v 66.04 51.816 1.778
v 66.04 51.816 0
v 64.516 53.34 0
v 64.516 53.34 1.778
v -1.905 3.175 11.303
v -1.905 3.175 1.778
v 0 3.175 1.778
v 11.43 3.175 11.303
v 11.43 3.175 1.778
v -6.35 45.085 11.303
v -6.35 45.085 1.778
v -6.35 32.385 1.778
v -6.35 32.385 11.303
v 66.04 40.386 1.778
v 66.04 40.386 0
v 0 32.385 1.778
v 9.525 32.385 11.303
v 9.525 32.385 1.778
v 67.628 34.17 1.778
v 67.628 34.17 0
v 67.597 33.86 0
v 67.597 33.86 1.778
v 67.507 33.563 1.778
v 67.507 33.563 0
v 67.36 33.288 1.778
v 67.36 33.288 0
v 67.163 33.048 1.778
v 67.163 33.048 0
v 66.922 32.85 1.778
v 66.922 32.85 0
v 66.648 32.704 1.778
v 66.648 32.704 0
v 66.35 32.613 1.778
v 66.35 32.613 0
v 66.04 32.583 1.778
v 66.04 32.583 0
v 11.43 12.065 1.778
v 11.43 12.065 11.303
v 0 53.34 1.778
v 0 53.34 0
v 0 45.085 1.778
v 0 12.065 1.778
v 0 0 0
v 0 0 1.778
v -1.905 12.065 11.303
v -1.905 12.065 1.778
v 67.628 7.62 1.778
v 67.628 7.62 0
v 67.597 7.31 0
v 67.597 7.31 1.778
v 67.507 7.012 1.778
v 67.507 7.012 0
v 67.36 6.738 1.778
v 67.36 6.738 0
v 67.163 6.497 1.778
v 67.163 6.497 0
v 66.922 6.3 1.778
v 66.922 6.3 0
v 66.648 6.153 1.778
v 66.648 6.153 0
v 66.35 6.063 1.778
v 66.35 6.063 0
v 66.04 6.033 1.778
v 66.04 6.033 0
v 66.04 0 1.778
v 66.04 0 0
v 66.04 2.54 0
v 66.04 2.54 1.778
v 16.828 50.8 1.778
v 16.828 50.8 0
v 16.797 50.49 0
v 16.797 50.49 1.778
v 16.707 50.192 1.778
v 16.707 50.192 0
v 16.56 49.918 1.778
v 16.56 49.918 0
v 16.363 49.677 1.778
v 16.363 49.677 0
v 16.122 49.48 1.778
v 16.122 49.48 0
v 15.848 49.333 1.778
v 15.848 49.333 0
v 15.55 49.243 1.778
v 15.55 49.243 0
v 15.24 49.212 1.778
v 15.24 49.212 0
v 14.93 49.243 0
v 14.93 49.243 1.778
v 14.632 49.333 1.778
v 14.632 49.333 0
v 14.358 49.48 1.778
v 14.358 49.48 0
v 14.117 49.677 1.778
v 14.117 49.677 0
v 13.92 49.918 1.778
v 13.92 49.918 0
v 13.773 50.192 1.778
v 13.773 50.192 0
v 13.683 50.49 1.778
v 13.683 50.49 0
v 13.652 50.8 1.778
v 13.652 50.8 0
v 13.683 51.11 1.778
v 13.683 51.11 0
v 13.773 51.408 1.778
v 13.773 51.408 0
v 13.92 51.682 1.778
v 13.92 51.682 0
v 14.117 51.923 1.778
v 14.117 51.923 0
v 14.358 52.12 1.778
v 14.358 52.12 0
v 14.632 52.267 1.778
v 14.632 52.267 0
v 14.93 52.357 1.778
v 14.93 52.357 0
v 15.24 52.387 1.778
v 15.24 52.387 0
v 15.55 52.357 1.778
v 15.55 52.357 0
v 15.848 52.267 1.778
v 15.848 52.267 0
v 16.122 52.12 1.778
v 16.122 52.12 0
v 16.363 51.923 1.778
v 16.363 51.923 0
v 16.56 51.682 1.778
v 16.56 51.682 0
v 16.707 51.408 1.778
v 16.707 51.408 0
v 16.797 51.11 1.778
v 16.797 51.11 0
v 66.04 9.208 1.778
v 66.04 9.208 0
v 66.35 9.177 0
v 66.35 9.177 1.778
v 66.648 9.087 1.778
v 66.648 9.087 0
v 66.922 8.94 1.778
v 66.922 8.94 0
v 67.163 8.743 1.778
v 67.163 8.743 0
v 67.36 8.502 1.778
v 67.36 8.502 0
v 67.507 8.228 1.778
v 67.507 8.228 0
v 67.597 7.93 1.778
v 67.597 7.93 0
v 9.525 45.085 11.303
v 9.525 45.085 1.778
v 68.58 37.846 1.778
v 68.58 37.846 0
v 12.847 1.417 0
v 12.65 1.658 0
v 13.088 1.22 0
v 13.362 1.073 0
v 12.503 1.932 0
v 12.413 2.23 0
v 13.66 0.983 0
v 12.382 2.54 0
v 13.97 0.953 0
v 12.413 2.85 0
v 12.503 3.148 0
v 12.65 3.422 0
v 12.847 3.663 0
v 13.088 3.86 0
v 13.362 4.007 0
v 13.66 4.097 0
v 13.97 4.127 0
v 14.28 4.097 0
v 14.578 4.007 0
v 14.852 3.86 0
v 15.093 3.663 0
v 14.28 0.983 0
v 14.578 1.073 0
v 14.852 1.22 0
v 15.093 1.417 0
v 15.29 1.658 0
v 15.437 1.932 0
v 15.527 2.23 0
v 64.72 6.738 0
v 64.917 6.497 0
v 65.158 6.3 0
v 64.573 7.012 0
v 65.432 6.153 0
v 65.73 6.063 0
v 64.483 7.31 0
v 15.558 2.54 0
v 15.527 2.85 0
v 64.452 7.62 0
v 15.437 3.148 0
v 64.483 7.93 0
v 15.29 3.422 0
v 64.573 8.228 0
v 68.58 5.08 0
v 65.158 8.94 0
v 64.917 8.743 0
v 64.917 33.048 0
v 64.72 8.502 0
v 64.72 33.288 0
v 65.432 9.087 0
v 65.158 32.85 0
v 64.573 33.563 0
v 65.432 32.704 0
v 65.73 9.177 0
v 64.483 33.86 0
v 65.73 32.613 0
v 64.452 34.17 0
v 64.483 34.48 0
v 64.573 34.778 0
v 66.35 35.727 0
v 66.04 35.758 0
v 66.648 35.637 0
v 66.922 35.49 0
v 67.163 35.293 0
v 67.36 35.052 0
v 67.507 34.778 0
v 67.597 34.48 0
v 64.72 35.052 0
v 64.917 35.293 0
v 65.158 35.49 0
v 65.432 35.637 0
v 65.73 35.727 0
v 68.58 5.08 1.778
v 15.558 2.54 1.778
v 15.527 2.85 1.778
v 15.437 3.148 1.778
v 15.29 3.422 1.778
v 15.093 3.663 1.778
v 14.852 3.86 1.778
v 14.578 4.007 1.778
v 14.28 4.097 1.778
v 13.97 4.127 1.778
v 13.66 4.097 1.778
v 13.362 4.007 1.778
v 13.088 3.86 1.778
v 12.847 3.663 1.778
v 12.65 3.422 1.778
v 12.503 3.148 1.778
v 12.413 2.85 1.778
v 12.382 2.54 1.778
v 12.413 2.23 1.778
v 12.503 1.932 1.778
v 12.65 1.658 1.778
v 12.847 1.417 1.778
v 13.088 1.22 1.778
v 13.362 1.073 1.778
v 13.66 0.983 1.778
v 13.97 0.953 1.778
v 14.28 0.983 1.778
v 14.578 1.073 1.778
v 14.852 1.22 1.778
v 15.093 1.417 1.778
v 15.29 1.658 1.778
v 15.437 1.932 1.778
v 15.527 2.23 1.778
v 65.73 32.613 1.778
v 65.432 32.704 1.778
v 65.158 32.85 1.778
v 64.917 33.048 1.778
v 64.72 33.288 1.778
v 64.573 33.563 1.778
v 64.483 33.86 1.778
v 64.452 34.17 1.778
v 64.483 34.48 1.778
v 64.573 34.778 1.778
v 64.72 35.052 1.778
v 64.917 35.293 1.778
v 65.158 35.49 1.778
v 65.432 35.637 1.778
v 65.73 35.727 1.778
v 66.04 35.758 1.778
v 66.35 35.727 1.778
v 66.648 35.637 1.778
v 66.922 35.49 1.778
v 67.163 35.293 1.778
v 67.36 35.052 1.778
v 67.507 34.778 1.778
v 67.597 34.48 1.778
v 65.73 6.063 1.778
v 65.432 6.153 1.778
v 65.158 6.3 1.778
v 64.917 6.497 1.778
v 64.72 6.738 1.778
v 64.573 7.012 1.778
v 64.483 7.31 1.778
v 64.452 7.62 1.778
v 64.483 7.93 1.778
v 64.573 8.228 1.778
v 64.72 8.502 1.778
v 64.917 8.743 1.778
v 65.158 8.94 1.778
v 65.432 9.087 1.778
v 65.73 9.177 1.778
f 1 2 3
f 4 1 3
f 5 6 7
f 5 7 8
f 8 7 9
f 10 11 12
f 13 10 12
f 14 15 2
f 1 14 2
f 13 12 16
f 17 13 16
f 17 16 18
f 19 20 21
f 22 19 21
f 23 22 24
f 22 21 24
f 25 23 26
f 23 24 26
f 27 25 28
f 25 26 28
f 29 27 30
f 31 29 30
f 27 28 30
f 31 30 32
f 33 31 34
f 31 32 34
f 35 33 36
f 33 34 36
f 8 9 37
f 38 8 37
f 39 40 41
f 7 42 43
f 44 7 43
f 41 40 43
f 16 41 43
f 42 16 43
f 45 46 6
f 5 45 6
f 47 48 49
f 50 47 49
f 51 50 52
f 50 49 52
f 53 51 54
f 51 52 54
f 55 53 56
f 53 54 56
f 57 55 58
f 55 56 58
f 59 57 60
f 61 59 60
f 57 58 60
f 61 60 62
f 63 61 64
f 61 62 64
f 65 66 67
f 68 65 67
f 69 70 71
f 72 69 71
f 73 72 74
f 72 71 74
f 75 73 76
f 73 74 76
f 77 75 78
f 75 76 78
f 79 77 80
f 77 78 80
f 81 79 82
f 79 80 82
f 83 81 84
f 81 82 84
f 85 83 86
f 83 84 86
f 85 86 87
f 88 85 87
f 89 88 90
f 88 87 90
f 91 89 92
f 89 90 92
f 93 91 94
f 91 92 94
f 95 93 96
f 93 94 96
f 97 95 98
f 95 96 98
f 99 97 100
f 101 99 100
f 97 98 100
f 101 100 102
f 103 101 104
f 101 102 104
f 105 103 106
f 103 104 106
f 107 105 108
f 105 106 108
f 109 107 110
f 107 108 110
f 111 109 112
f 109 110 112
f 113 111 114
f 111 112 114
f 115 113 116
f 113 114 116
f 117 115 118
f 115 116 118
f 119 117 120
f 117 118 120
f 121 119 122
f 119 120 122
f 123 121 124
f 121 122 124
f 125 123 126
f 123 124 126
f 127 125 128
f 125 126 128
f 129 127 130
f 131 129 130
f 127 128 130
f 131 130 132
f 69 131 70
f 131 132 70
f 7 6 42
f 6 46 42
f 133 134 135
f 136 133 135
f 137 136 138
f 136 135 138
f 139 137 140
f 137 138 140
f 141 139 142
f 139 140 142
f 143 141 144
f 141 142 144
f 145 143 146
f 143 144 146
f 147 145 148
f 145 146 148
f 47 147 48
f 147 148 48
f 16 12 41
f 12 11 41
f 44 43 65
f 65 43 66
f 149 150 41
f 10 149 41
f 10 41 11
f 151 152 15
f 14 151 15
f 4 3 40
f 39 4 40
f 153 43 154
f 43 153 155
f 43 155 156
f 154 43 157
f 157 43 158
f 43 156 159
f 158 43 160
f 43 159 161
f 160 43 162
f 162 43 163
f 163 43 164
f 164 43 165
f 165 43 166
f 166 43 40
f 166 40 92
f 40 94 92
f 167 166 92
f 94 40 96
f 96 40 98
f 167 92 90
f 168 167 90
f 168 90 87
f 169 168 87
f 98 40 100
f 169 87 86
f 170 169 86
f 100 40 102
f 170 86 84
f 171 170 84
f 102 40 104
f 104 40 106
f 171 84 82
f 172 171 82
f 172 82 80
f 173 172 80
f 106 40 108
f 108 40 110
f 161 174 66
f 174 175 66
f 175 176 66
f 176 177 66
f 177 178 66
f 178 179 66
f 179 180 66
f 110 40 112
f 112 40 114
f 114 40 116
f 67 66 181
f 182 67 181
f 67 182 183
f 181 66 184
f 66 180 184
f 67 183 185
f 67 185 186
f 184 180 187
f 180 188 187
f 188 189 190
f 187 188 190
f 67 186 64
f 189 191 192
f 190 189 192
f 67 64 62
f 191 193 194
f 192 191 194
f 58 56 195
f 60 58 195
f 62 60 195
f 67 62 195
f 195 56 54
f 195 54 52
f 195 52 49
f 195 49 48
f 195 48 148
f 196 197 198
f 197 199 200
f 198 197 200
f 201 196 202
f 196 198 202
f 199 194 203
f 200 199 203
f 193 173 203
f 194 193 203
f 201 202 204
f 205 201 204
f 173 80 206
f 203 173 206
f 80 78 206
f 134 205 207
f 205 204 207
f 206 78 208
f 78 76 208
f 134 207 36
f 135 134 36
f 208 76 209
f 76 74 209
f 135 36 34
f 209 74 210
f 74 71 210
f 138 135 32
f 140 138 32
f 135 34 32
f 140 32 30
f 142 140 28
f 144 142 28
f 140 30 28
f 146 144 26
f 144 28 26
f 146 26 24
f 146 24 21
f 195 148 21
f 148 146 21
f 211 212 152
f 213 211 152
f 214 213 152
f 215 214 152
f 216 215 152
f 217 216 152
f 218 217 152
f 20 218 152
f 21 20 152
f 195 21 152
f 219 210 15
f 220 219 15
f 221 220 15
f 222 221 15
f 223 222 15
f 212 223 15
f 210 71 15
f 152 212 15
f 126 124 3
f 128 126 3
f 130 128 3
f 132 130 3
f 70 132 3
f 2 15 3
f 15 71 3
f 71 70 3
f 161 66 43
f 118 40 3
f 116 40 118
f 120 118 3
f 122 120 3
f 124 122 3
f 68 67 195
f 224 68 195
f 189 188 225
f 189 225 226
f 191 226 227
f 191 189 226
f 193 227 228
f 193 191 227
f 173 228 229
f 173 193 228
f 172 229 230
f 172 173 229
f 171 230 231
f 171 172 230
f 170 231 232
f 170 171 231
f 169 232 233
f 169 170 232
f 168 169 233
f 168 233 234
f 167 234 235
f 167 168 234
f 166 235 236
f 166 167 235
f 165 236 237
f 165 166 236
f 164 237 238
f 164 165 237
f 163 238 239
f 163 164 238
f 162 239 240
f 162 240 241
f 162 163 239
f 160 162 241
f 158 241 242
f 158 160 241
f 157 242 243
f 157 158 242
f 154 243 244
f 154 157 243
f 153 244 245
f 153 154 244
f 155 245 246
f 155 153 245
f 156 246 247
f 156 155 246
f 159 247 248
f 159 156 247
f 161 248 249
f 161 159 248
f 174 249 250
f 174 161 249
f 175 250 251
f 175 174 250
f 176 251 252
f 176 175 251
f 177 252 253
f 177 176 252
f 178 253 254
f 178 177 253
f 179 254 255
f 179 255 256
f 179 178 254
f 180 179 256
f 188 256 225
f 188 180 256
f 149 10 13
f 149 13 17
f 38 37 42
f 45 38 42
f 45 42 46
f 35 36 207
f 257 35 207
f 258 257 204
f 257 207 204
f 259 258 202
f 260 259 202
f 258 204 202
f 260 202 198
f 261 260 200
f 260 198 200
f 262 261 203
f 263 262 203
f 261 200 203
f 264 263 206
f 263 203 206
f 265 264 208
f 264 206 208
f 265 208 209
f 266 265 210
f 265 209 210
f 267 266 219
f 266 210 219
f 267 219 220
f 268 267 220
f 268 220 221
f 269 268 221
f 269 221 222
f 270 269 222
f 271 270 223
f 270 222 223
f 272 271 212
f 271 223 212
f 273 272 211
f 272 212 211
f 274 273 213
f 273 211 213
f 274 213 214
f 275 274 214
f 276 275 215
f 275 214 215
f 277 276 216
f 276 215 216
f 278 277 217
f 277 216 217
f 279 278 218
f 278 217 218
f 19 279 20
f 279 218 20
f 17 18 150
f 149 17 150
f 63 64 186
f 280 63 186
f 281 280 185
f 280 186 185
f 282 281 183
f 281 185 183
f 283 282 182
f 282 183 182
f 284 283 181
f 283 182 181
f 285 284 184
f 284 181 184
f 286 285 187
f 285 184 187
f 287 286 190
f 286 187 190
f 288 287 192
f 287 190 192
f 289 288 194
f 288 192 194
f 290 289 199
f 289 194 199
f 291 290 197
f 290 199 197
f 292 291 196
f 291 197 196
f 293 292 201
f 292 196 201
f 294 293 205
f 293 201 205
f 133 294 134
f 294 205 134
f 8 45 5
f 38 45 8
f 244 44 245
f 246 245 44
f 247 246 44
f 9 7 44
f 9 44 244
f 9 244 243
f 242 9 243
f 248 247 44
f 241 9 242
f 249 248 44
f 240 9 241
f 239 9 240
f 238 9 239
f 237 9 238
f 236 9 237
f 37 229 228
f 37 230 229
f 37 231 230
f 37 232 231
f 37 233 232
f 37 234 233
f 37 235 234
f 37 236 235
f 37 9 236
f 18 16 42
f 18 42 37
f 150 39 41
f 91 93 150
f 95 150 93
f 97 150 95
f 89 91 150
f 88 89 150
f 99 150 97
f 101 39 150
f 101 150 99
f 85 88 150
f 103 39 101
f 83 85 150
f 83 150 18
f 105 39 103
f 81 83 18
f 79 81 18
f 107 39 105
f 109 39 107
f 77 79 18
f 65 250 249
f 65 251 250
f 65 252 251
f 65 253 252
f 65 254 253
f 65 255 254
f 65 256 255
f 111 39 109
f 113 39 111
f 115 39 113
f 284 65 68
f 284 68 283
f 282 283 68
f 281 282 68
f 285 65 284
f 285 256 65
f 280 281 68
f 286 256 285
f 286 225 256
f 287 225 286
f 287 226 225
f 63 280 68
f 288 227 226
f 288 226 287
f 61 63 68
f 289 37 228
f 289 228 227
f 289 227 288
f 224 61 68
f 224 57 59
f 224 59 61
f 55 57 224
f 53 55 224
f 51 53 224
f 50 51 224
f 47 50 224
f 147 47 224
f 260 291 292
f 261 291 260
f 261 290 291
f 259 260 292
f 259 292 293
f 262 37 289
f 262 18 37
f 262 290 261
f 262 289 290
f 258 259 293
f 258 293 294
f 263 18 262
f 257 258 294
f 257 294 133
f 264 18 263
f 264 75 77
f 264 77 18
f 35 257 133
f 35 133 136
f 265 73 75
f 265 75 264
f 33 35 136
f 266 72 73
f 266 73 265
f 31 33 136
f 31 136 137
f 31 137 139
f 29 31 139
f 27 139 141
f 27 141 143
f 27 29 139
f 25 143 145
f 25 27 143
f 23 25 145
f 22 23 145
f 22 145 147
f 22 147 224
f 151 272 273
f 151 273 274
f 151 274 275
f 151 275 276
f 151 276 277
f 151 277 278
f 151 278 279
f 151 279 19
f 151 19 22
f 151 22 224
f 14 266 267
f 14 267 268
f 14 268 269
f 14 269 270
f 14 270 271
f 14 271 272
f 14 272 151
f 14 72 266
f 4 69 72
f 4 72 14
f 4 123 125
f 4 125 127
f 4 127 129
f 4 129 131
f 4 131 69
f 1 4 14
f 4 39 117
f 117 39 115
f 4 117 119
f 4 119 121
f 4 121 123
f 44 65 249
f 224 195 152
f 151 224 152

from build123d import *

# Parameters (mm, degrees)
F0_R     = 1.5875
F1_DEPTH = 1.778
F3_DEPTH = 9.525


with BuildPart() as f1:
    # F0 (on Top) → F1 (new body)
    with BuildSketch(Plane.XY):
        with BuildLine():
            Line((0, 53.34), (0, 0))
            Line((0, 0), (66.04, 0))
            Line((66.04, 0), (66.04, 2.54))
            Line((66.04, 2.54), (66.04, 6.0325))
            ThreePointArc((66.04, 6.0325), (64.4525, 7.62), (66.04, 9.2075))
            ThreePointArc((66.04, 9.2075), (67.1625320151, 8.7425320151), (67.6275, 7.62))
            Line((67.6275, 7.62), (68.58, 7.62))
            Line((68.58, 7.62), (68.58, 37.846))
            Line((68.58, 37.846), (66.04, 40.386))
            Line((66.04, 40.386), (66.04, 51.816))
            Line((66.04, 51.816), (64.516, 53.34))
            Line((64.516, 53.34), (0, 53.34))
        make_face()
        with Locations((13.97, 2.54)):
            Circle(F0_R, mode=Mode.SUBTRACT)
        with BuildLine():
            ThreePointArc((13.6525, 50.8), (15.24, 52.3875), (16.8275, 50.8))
            ThreePointArc((16.8275, 50.8), (15.24, 49.2125), (13.6525, 50.8))
        make_face(mode=Mode.SUBTRACT)
        with BuildLine():
            ThreePointArc((67.6275, 34.1701958202), (67.1625320151, 33.0476638051), (66.04, 32.5826958202))
            ThreePointArc((66.04, 32.5826958202), (64.9174679849, 35.2927278354), (67.6275, 34.1701958202))
        make_face(mode=Mode.SUBTRACT)
        with BuildLine():
            Line((66.04, 6.0325), (66.04, 2.54))
            Line((66.04, 2.54), (68.58, 5.08))
            Line((68.58, 5.08), (68.58, 7.62))
            Line((68.58, 7.62), (67.6275, 7.62))
            ThreePointArc((67.6275, 7.62), (67.1625320151, 6.4974679849), (66.04, 6.0325))
        make_face()
    extrude(amount=F1_DEPTH)

    # F2 (on face) → F3 (join)
    with BuildSketch(Plane.XY.offset(1.778)):
        Polygon((0, 32.385), (9.525, 32.385), (9.525, 45.085), (-6.35, 45.085), (-6.35, 32.385), align=None)
        Polygon((0, 3.175), (11.43, 3.175), (11.43, 12.065), (-1.905, 12.065), (-1.905, 3.175), align=None)
    extrude(amount=F3_DEPTH)


solid = f1.part
